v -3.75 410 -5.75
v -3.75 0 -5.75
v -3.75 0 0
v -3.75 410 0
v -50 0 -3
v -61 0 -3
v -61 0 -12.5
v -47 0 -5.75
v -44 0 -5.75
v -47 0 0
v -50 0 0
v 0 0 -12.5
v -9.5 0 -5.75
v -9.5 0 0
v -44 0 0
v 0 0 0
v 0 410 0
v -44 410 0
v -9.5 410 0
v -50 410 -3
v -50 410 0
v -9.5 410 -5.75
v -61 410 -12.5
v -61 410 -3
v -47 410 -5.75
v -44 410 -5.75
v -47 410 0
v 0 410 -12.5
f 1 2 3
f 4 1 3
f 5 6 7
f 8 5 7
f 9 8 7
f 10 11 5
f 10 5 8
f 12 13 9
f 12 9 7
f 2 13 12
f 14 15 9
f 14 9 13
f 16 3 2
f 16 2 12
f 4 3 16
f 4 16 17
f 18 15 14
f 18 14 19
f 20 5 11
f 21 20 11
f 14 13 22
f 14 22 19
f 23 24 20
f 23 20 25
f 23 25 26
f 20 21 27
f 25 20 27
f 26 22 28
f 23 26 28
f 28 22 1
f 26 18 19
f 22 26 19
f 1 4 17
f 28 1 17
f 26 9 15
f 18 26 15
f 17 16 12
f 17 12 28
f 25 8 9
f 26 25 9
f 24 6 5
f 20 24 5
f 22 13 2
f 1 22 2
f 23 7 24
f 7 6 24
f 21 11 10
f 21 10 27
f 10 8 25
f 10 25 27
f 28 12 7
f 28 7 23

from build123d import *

# Parameters (mm, degrees)
SKETCH_W             = 410
SKETCH_H             = 61
PAD_DEPTH            = 11.5
SKETCH001_W          = 11
SKETCH001_H          = 3
POCKET_DEPTH         = 410.001
SKETCH002_W          = 5.75
SKETCH002_H          = 5.75
POCKET001_DEPTH      = 410.001
SKETCH003_W          = 3
SKETCH003_H          = 5.75
POCKET002_DEPTH      = 410.001
SKETCH005_W          = 410
SKETCH005_H          = 61
PAD001_DEPTH         = 1
BODY_PLACEMENT_ANGLE = 90


with BuildPart() as part:
    # Sketch → Pad (new body)
    with BuildSketch(Plane.XY):
        with Locations((205, 30.5)):
            Rectangle(SKETCH_W, SKETCH_H)
    extrude(amount=PAD_DEPTH)

    # Sketch001 (on Face4 of Pad) → Pocket (cut, through all)
    with BuildSketch(Plane(origin=(0, 0, 0), x_dir=(0, -1, 0), z_dir=(-1, 0, 0))):
        with Locations((-55.5, 10)):
            Rectangle(SKETCH001_W, SKETCH001_H)
    extrude(amount=-POCKET_DEPTH, mode=Mode.SUBTRACT)

    # Sketch002 (on Face2 of Pocket) → Pocket001 (cut, through all)
    with BuildSketch(Plane(origin=(0, 0, 0), x_dir=(0, -1, 0), z_dir=(-1, 0, 0))):
        with Locations((-6.625, 8.625)):
            Rectangle(SKETCH002_W, SKETCH002_H)
    extrude(amount=-POCKET001_DEPTH, mode=Mode.SUBTRACT)

    # Sketch003 (on Face2 of Pocket001) → Pocket002 (cut, through all)
    with BuildSketch(Plane(origin=(0, 0, 0), x_dir=(0, -1, 0), z_dir=(-1, 0, 0))):
        with Locations((-45.5, 8.625)):
            Rectangle(SKETCH003_W, SKETCH003_H)
    extrude(amount=-POCKET002_DEPTH, mode=Mode.SUBTRACT)

    # Sketch005 (on Face4 of Pocket002) → Pad001 (join)
    with BuildSketch(Plane(origin=(0, 0, 0), x_dir=(1, 0, 0), z_dir=(0, 0, -1))):
        with Locations((205, -30.5)):
            Rectangle(SKETCH005_W, SKETCH005_H)
    extrude(amount=PAD001_DEPTH)


with BuildPart() as part_1:
    # Body placement: moved
    add(part.part.moved(Location((0, 0, -11.5))).rotate(Axis((0, 0, -11.5), (0, 0, 1)), BODY_PLACEMENT_ANGLE))


solid = part_1.part
